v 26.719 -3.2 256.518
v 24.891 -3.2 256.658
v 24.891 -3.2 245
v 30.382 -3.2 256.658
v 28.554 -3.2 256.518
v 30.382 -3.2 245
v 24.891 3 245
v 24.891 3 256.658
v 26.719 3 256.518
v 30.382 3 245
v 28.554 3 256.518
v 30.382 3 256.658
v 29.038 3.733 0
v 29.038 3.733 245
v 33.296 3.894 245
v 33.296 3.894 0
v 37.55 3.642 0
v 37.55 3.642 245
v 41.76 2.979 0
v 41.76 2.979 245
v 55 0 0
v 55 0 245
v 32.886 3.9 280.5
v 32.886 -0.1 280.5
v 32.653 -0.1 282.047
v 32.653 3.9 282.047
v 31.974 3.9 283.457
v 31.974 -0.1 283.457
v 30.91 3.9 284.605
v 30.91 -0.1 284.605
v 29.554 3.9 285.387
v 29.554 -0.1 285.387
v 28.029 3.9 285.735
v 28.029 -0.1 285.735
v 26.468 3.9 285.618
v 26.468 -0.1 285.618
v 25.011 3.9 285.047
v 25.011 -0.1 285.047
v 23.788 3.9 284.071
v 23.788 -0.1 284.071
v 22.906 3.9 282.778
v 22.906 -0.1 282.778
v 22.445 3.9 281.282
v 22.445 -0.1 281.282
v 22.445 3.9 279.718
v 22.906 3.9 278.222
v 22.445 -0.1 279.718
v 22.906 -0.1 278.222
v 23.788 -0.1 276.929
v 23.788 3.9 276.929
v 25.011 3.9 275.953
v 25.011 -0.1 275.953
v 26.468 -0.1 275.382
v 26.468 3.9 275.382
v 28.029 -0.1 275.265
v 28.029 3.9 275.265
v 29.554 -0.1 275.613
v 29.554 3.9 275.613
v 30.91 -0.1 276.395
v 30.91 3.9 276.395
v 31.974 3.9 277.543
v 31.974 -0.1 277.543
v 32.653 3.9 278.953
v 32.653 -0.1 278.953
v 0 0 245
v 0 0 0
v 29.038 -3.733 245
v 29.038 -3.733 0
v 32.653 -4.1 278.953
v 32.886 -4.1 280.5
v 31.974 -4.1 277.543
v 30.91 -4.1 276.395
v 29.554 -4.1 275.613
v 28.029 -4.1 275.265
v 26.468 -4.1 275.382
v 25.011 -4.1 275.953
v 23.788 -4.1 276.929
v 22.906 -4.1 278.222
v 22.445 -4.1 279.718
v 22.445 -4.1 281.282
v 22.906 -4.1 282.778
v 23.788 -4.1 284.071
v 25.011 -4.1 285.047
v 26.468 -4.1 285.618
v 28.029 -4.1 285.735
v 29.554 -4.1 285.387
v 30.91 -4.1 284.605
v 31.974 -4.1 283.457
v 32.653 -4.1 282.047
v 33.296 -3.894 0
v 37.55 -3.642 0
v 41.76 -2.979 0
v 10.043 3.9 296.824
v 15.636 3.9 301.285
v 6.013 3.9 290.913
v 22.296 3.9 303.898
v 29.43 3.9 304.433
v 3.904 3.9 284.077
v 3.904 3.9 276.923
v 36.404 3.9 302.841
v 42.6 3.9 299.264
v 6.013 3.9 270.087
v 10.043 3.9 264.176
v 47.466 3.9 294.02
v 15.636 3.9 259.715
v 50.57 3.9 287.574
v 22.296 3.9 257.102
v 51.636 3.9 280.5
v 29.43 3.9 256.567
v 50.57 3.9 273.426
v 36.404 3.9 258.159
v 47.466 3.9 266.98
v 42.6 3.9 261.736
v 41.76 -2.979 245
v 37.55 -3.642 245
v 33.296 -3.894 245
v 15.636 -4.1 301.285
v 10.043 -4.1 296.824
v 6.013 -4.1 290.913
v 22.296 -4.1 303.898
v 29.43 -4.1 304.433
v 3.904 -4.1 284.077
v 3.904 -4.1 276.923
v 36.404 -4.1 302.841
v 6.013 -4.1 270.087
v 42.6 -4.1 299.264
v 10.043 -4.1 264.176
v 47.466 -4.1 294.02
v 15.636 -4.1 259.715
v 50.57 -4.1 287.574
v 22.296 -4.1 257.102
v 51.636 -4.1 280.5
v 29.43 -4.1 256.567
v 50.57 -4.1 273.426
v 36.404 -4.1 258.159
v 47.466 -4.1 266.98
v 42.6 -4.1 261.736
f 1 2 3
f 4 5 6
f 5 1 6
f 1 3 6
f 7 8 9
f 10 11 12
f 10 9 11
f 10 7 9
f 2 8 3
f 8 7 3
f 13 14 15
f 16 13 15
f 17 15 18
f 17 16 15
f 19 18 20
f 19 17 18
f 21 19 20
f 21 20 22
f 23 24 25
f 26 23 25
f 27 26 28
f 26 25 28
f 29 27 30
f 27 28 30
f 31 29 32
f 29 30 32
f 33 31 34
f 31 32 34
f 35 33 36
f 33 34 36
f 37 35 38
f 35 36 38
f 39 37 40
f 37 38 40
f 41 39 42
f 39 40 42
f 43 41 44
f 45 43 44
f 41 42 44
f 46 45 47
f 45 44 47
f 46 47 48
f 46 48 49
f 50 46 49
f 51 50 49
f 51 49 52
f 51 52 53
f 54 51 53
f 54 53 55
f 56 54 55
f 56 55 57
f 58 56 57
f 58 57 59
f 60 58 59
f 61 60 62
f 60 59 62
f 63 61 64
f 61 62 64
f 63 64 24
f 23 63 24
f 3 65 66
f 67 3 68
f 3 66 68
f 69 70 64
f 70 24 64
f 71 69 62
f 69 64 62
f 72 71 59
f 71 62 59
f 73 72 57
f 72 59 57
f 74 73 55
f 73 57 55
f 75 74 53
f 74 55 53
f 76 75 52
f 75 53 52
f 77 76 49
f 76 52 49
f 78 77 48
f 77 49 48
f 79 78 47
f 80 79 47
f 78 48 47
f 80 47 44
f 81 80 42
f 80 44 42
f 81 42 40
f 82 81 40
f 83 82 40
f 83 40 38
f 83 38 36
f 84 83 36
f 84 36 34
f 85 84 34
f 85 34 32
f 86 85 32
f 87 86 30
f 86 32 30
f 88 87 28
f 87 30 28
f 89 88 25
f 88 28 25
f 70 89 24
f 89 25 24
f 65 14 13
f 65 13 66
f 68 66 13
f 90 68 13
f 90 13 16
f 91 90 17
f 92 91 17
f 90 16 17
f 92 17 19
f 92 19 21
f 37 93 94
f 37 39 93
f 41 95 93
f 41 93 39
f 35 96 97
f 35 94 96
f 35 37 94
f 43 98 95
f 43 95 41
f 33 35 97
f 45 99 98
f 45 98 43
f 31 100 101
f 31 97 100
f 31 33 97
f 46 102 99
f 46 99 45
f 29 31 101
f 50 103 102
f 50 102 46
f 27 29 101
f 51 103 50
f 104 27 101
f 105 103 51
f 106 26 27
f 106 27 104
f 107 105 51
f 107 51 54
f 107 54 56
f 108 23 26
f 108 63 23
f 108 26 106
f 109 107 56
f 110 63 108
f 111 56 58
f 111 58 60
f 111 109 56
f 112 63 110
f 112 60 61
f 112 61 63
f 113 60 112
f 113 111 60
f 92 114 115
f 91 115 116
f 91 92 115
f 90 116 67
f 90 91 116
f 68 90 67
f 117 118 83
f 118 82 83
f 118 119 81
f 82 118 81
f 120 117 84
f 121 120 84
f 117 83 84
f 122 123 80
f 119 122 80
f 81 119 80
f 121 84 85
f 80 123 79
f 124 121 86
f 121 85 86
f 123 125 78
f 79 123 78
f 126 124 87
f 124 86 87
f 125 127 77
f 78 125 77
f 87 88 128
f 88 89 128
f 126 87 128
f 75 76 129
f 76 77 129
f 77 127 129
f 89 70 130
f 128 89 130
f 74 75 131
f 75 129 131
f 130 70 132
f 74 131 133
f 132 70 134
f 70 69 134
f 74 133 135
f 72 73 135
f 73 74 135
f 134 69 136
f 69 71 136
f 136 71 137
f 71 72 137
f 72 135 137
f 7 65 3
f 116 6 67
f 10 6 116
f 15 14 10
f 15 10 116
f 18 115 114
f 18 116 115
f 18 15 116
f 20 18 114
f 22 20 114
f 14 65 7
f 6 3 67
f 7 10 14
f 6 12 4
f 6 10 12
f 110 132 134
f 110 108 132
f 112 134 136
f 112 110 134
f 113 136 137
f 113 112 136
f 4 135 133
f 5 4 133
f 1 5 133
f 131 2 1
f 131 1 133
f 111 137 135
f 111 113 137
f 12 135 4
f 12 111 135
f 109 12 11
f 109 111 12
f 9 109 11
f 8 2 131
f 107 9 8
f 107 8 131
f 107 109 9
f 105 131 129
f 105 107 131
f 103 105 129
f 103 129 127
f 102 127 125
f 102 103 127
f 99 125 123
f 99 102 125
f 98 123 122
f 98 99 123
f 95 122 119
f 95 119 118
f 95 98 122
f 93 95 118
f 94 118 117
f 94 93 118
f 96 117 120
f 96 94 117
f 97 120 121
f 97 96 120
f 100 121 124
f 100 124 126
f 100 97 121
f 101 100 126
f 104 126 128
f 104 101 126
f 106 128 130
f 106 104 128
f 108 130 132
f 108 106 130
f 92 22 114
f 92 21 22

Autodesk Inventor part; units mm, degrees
ref_plane "YZ Plane" through (0, 0, 0) normal (1, 0, 0) x (0, 1, 0)
ref_plane "XZ Plane" through (0, 0, 0) normal (0, 1, 0) x (-1, 0, 0)
ref_plane "XY Plane" through (0, 0, 0) normal (0, 0, 1) x (1, 0, 0)
sketch "Sketch1" plane through (0, 0, 0) normal (0, 0, 1) x (1, 0, 0)
  line L0 (0, 0) -> (55, 0)
  line L1 (0, 0) -> (35, 0)
  line L2 (35, 3.8429) -> (35, 4.5)
  line L3 (29.0376, 3.7334) -> (0, 0)
  line L4 (41.7595, 2.9791) -> (55, 0)
  arc A0 (43.1851, 2.6584) -> (25.4094, 3.2669) centre (32.8243, -40.0614) ccw
  line L5 (-5.4039, 0) -> (70.1536, 0)
  line L6 (0, 0) -> (27.5, 0)
  line L7 (25.4094, 0) -> (29.1094, 0)
  line L8 (29.1094, 0) -> (29.1094, 2.5)
  line L9 (29.1094, 2.5) -> (25.4094, 2.5)
  line L10 (25.4094, 2.5) -> (25.4094, 0)
  dimension "d0" = 55
  dimension "d1" = 35
  dimension "d2" = 4.5
  dimension "d5" = 27.5
  dimension "d6" = 3.7
  dimension "d7" = 2.5
extrude "Extrusion1" add sketch "Sketch1" along normal blind 245 contours L3 A0 L4 L0 L8 L9 L10 | L10 L9 L8 L0
mirror "Mirror1" about plane through (0, 0, 0) normal (0, 1, 0) of "Extrusion1"
sketch "Sketch2" plane through (0, 0, 245) normal (0, 0, 1) x (1, 0, 0)
  line L0 (29.0376, 3.7334) -> (0, 0) projected
  line L1 (0, 0) -> (27.5, 0)
  line L2 (27.5, 0) -> (27.5, 3)
  line L3 (27.5, 3) -> (24.8907, 3)
  line L4 (24.8907, 3) -> (24.8907, -3.2002)
  line L5 (29.0376, -3.7334) -> (0, 0) projected
  line L6 (24.8907, 3) -> (30.3823, 3)
  line L7 (30.3823, 3) -> (30.3823, -3.2002)
  line L8 (30.3823, -3.2002) -> (24.8907, -3.2002)
  line L9 (24.8907, -3.2002) -> (24.8907, 3)
  dimension "d8" = 27.5
  dimension "d9" = 3
extrude "Extrusion2" add sketch "Sketch2" along normal blind 10 contours L4 L3 L2 L1 | L1 L2 L6 L7 L8 L4
ref_plane "Work Plane1" through (24.8907, -0.1, 245) normal (0, 1, 0) x (1, 0, 0)
sketch "Sketch3" plane through (24.8907, -0.1, 245) normal (0, 1, 0) x (1, 0, 0)
  line L0 (5.4916, -10) -> (-0.0004, -10)
  line L1 (-0.0004, -10) -> (-0.0004, -35.5)
  line L2 (-0.0004, -35.5) -> (5.4916, -35.5)
  line L3 (5.4916, -35.5) -> (5.4916, -10)
  circle A0 centre (2.7456, -35.5) radius 24
  circle A1 centre (2.7456, -35.5) radius 5.25
  point P0 (-24.8907, 245)
  dimension "d13" = 5.492
  dimension "d14" = 25.5
  dimension "d15" = 48
  dimension "d16" = 10.5
extrude "Extrusion3" add sketch "Sketch3" along normal blind 4 and the other way blind 4 contours A0 L1 A1 L3 | L3 A1 L1 A0
sketch "Sketch4" plane through (0, 0, 255) normal (0, 0, 1) x (1, 0, 0)
  line L0 (24.8907, -3.2002) -> (30.3823, -3.2002) projected
  line L1 (24.8907, 3) -> (24.8907, -3.2002) projected
  line L2 (30.3823, -3.2002) -> (24.8907, -3.2002)
  line L3 (24.8907, -3.2002) -> (24.8907, 3)
  line L4 (24.8907, 3) -> (30.3823, 3)
  line L5 (30.3823, 3) -> (30.3823, -3.2002)
  point P0 (0, 0)
extrude "Extrusion4" add sketch "Sketch4" along normal blind 15
properties part number "Ruder"
